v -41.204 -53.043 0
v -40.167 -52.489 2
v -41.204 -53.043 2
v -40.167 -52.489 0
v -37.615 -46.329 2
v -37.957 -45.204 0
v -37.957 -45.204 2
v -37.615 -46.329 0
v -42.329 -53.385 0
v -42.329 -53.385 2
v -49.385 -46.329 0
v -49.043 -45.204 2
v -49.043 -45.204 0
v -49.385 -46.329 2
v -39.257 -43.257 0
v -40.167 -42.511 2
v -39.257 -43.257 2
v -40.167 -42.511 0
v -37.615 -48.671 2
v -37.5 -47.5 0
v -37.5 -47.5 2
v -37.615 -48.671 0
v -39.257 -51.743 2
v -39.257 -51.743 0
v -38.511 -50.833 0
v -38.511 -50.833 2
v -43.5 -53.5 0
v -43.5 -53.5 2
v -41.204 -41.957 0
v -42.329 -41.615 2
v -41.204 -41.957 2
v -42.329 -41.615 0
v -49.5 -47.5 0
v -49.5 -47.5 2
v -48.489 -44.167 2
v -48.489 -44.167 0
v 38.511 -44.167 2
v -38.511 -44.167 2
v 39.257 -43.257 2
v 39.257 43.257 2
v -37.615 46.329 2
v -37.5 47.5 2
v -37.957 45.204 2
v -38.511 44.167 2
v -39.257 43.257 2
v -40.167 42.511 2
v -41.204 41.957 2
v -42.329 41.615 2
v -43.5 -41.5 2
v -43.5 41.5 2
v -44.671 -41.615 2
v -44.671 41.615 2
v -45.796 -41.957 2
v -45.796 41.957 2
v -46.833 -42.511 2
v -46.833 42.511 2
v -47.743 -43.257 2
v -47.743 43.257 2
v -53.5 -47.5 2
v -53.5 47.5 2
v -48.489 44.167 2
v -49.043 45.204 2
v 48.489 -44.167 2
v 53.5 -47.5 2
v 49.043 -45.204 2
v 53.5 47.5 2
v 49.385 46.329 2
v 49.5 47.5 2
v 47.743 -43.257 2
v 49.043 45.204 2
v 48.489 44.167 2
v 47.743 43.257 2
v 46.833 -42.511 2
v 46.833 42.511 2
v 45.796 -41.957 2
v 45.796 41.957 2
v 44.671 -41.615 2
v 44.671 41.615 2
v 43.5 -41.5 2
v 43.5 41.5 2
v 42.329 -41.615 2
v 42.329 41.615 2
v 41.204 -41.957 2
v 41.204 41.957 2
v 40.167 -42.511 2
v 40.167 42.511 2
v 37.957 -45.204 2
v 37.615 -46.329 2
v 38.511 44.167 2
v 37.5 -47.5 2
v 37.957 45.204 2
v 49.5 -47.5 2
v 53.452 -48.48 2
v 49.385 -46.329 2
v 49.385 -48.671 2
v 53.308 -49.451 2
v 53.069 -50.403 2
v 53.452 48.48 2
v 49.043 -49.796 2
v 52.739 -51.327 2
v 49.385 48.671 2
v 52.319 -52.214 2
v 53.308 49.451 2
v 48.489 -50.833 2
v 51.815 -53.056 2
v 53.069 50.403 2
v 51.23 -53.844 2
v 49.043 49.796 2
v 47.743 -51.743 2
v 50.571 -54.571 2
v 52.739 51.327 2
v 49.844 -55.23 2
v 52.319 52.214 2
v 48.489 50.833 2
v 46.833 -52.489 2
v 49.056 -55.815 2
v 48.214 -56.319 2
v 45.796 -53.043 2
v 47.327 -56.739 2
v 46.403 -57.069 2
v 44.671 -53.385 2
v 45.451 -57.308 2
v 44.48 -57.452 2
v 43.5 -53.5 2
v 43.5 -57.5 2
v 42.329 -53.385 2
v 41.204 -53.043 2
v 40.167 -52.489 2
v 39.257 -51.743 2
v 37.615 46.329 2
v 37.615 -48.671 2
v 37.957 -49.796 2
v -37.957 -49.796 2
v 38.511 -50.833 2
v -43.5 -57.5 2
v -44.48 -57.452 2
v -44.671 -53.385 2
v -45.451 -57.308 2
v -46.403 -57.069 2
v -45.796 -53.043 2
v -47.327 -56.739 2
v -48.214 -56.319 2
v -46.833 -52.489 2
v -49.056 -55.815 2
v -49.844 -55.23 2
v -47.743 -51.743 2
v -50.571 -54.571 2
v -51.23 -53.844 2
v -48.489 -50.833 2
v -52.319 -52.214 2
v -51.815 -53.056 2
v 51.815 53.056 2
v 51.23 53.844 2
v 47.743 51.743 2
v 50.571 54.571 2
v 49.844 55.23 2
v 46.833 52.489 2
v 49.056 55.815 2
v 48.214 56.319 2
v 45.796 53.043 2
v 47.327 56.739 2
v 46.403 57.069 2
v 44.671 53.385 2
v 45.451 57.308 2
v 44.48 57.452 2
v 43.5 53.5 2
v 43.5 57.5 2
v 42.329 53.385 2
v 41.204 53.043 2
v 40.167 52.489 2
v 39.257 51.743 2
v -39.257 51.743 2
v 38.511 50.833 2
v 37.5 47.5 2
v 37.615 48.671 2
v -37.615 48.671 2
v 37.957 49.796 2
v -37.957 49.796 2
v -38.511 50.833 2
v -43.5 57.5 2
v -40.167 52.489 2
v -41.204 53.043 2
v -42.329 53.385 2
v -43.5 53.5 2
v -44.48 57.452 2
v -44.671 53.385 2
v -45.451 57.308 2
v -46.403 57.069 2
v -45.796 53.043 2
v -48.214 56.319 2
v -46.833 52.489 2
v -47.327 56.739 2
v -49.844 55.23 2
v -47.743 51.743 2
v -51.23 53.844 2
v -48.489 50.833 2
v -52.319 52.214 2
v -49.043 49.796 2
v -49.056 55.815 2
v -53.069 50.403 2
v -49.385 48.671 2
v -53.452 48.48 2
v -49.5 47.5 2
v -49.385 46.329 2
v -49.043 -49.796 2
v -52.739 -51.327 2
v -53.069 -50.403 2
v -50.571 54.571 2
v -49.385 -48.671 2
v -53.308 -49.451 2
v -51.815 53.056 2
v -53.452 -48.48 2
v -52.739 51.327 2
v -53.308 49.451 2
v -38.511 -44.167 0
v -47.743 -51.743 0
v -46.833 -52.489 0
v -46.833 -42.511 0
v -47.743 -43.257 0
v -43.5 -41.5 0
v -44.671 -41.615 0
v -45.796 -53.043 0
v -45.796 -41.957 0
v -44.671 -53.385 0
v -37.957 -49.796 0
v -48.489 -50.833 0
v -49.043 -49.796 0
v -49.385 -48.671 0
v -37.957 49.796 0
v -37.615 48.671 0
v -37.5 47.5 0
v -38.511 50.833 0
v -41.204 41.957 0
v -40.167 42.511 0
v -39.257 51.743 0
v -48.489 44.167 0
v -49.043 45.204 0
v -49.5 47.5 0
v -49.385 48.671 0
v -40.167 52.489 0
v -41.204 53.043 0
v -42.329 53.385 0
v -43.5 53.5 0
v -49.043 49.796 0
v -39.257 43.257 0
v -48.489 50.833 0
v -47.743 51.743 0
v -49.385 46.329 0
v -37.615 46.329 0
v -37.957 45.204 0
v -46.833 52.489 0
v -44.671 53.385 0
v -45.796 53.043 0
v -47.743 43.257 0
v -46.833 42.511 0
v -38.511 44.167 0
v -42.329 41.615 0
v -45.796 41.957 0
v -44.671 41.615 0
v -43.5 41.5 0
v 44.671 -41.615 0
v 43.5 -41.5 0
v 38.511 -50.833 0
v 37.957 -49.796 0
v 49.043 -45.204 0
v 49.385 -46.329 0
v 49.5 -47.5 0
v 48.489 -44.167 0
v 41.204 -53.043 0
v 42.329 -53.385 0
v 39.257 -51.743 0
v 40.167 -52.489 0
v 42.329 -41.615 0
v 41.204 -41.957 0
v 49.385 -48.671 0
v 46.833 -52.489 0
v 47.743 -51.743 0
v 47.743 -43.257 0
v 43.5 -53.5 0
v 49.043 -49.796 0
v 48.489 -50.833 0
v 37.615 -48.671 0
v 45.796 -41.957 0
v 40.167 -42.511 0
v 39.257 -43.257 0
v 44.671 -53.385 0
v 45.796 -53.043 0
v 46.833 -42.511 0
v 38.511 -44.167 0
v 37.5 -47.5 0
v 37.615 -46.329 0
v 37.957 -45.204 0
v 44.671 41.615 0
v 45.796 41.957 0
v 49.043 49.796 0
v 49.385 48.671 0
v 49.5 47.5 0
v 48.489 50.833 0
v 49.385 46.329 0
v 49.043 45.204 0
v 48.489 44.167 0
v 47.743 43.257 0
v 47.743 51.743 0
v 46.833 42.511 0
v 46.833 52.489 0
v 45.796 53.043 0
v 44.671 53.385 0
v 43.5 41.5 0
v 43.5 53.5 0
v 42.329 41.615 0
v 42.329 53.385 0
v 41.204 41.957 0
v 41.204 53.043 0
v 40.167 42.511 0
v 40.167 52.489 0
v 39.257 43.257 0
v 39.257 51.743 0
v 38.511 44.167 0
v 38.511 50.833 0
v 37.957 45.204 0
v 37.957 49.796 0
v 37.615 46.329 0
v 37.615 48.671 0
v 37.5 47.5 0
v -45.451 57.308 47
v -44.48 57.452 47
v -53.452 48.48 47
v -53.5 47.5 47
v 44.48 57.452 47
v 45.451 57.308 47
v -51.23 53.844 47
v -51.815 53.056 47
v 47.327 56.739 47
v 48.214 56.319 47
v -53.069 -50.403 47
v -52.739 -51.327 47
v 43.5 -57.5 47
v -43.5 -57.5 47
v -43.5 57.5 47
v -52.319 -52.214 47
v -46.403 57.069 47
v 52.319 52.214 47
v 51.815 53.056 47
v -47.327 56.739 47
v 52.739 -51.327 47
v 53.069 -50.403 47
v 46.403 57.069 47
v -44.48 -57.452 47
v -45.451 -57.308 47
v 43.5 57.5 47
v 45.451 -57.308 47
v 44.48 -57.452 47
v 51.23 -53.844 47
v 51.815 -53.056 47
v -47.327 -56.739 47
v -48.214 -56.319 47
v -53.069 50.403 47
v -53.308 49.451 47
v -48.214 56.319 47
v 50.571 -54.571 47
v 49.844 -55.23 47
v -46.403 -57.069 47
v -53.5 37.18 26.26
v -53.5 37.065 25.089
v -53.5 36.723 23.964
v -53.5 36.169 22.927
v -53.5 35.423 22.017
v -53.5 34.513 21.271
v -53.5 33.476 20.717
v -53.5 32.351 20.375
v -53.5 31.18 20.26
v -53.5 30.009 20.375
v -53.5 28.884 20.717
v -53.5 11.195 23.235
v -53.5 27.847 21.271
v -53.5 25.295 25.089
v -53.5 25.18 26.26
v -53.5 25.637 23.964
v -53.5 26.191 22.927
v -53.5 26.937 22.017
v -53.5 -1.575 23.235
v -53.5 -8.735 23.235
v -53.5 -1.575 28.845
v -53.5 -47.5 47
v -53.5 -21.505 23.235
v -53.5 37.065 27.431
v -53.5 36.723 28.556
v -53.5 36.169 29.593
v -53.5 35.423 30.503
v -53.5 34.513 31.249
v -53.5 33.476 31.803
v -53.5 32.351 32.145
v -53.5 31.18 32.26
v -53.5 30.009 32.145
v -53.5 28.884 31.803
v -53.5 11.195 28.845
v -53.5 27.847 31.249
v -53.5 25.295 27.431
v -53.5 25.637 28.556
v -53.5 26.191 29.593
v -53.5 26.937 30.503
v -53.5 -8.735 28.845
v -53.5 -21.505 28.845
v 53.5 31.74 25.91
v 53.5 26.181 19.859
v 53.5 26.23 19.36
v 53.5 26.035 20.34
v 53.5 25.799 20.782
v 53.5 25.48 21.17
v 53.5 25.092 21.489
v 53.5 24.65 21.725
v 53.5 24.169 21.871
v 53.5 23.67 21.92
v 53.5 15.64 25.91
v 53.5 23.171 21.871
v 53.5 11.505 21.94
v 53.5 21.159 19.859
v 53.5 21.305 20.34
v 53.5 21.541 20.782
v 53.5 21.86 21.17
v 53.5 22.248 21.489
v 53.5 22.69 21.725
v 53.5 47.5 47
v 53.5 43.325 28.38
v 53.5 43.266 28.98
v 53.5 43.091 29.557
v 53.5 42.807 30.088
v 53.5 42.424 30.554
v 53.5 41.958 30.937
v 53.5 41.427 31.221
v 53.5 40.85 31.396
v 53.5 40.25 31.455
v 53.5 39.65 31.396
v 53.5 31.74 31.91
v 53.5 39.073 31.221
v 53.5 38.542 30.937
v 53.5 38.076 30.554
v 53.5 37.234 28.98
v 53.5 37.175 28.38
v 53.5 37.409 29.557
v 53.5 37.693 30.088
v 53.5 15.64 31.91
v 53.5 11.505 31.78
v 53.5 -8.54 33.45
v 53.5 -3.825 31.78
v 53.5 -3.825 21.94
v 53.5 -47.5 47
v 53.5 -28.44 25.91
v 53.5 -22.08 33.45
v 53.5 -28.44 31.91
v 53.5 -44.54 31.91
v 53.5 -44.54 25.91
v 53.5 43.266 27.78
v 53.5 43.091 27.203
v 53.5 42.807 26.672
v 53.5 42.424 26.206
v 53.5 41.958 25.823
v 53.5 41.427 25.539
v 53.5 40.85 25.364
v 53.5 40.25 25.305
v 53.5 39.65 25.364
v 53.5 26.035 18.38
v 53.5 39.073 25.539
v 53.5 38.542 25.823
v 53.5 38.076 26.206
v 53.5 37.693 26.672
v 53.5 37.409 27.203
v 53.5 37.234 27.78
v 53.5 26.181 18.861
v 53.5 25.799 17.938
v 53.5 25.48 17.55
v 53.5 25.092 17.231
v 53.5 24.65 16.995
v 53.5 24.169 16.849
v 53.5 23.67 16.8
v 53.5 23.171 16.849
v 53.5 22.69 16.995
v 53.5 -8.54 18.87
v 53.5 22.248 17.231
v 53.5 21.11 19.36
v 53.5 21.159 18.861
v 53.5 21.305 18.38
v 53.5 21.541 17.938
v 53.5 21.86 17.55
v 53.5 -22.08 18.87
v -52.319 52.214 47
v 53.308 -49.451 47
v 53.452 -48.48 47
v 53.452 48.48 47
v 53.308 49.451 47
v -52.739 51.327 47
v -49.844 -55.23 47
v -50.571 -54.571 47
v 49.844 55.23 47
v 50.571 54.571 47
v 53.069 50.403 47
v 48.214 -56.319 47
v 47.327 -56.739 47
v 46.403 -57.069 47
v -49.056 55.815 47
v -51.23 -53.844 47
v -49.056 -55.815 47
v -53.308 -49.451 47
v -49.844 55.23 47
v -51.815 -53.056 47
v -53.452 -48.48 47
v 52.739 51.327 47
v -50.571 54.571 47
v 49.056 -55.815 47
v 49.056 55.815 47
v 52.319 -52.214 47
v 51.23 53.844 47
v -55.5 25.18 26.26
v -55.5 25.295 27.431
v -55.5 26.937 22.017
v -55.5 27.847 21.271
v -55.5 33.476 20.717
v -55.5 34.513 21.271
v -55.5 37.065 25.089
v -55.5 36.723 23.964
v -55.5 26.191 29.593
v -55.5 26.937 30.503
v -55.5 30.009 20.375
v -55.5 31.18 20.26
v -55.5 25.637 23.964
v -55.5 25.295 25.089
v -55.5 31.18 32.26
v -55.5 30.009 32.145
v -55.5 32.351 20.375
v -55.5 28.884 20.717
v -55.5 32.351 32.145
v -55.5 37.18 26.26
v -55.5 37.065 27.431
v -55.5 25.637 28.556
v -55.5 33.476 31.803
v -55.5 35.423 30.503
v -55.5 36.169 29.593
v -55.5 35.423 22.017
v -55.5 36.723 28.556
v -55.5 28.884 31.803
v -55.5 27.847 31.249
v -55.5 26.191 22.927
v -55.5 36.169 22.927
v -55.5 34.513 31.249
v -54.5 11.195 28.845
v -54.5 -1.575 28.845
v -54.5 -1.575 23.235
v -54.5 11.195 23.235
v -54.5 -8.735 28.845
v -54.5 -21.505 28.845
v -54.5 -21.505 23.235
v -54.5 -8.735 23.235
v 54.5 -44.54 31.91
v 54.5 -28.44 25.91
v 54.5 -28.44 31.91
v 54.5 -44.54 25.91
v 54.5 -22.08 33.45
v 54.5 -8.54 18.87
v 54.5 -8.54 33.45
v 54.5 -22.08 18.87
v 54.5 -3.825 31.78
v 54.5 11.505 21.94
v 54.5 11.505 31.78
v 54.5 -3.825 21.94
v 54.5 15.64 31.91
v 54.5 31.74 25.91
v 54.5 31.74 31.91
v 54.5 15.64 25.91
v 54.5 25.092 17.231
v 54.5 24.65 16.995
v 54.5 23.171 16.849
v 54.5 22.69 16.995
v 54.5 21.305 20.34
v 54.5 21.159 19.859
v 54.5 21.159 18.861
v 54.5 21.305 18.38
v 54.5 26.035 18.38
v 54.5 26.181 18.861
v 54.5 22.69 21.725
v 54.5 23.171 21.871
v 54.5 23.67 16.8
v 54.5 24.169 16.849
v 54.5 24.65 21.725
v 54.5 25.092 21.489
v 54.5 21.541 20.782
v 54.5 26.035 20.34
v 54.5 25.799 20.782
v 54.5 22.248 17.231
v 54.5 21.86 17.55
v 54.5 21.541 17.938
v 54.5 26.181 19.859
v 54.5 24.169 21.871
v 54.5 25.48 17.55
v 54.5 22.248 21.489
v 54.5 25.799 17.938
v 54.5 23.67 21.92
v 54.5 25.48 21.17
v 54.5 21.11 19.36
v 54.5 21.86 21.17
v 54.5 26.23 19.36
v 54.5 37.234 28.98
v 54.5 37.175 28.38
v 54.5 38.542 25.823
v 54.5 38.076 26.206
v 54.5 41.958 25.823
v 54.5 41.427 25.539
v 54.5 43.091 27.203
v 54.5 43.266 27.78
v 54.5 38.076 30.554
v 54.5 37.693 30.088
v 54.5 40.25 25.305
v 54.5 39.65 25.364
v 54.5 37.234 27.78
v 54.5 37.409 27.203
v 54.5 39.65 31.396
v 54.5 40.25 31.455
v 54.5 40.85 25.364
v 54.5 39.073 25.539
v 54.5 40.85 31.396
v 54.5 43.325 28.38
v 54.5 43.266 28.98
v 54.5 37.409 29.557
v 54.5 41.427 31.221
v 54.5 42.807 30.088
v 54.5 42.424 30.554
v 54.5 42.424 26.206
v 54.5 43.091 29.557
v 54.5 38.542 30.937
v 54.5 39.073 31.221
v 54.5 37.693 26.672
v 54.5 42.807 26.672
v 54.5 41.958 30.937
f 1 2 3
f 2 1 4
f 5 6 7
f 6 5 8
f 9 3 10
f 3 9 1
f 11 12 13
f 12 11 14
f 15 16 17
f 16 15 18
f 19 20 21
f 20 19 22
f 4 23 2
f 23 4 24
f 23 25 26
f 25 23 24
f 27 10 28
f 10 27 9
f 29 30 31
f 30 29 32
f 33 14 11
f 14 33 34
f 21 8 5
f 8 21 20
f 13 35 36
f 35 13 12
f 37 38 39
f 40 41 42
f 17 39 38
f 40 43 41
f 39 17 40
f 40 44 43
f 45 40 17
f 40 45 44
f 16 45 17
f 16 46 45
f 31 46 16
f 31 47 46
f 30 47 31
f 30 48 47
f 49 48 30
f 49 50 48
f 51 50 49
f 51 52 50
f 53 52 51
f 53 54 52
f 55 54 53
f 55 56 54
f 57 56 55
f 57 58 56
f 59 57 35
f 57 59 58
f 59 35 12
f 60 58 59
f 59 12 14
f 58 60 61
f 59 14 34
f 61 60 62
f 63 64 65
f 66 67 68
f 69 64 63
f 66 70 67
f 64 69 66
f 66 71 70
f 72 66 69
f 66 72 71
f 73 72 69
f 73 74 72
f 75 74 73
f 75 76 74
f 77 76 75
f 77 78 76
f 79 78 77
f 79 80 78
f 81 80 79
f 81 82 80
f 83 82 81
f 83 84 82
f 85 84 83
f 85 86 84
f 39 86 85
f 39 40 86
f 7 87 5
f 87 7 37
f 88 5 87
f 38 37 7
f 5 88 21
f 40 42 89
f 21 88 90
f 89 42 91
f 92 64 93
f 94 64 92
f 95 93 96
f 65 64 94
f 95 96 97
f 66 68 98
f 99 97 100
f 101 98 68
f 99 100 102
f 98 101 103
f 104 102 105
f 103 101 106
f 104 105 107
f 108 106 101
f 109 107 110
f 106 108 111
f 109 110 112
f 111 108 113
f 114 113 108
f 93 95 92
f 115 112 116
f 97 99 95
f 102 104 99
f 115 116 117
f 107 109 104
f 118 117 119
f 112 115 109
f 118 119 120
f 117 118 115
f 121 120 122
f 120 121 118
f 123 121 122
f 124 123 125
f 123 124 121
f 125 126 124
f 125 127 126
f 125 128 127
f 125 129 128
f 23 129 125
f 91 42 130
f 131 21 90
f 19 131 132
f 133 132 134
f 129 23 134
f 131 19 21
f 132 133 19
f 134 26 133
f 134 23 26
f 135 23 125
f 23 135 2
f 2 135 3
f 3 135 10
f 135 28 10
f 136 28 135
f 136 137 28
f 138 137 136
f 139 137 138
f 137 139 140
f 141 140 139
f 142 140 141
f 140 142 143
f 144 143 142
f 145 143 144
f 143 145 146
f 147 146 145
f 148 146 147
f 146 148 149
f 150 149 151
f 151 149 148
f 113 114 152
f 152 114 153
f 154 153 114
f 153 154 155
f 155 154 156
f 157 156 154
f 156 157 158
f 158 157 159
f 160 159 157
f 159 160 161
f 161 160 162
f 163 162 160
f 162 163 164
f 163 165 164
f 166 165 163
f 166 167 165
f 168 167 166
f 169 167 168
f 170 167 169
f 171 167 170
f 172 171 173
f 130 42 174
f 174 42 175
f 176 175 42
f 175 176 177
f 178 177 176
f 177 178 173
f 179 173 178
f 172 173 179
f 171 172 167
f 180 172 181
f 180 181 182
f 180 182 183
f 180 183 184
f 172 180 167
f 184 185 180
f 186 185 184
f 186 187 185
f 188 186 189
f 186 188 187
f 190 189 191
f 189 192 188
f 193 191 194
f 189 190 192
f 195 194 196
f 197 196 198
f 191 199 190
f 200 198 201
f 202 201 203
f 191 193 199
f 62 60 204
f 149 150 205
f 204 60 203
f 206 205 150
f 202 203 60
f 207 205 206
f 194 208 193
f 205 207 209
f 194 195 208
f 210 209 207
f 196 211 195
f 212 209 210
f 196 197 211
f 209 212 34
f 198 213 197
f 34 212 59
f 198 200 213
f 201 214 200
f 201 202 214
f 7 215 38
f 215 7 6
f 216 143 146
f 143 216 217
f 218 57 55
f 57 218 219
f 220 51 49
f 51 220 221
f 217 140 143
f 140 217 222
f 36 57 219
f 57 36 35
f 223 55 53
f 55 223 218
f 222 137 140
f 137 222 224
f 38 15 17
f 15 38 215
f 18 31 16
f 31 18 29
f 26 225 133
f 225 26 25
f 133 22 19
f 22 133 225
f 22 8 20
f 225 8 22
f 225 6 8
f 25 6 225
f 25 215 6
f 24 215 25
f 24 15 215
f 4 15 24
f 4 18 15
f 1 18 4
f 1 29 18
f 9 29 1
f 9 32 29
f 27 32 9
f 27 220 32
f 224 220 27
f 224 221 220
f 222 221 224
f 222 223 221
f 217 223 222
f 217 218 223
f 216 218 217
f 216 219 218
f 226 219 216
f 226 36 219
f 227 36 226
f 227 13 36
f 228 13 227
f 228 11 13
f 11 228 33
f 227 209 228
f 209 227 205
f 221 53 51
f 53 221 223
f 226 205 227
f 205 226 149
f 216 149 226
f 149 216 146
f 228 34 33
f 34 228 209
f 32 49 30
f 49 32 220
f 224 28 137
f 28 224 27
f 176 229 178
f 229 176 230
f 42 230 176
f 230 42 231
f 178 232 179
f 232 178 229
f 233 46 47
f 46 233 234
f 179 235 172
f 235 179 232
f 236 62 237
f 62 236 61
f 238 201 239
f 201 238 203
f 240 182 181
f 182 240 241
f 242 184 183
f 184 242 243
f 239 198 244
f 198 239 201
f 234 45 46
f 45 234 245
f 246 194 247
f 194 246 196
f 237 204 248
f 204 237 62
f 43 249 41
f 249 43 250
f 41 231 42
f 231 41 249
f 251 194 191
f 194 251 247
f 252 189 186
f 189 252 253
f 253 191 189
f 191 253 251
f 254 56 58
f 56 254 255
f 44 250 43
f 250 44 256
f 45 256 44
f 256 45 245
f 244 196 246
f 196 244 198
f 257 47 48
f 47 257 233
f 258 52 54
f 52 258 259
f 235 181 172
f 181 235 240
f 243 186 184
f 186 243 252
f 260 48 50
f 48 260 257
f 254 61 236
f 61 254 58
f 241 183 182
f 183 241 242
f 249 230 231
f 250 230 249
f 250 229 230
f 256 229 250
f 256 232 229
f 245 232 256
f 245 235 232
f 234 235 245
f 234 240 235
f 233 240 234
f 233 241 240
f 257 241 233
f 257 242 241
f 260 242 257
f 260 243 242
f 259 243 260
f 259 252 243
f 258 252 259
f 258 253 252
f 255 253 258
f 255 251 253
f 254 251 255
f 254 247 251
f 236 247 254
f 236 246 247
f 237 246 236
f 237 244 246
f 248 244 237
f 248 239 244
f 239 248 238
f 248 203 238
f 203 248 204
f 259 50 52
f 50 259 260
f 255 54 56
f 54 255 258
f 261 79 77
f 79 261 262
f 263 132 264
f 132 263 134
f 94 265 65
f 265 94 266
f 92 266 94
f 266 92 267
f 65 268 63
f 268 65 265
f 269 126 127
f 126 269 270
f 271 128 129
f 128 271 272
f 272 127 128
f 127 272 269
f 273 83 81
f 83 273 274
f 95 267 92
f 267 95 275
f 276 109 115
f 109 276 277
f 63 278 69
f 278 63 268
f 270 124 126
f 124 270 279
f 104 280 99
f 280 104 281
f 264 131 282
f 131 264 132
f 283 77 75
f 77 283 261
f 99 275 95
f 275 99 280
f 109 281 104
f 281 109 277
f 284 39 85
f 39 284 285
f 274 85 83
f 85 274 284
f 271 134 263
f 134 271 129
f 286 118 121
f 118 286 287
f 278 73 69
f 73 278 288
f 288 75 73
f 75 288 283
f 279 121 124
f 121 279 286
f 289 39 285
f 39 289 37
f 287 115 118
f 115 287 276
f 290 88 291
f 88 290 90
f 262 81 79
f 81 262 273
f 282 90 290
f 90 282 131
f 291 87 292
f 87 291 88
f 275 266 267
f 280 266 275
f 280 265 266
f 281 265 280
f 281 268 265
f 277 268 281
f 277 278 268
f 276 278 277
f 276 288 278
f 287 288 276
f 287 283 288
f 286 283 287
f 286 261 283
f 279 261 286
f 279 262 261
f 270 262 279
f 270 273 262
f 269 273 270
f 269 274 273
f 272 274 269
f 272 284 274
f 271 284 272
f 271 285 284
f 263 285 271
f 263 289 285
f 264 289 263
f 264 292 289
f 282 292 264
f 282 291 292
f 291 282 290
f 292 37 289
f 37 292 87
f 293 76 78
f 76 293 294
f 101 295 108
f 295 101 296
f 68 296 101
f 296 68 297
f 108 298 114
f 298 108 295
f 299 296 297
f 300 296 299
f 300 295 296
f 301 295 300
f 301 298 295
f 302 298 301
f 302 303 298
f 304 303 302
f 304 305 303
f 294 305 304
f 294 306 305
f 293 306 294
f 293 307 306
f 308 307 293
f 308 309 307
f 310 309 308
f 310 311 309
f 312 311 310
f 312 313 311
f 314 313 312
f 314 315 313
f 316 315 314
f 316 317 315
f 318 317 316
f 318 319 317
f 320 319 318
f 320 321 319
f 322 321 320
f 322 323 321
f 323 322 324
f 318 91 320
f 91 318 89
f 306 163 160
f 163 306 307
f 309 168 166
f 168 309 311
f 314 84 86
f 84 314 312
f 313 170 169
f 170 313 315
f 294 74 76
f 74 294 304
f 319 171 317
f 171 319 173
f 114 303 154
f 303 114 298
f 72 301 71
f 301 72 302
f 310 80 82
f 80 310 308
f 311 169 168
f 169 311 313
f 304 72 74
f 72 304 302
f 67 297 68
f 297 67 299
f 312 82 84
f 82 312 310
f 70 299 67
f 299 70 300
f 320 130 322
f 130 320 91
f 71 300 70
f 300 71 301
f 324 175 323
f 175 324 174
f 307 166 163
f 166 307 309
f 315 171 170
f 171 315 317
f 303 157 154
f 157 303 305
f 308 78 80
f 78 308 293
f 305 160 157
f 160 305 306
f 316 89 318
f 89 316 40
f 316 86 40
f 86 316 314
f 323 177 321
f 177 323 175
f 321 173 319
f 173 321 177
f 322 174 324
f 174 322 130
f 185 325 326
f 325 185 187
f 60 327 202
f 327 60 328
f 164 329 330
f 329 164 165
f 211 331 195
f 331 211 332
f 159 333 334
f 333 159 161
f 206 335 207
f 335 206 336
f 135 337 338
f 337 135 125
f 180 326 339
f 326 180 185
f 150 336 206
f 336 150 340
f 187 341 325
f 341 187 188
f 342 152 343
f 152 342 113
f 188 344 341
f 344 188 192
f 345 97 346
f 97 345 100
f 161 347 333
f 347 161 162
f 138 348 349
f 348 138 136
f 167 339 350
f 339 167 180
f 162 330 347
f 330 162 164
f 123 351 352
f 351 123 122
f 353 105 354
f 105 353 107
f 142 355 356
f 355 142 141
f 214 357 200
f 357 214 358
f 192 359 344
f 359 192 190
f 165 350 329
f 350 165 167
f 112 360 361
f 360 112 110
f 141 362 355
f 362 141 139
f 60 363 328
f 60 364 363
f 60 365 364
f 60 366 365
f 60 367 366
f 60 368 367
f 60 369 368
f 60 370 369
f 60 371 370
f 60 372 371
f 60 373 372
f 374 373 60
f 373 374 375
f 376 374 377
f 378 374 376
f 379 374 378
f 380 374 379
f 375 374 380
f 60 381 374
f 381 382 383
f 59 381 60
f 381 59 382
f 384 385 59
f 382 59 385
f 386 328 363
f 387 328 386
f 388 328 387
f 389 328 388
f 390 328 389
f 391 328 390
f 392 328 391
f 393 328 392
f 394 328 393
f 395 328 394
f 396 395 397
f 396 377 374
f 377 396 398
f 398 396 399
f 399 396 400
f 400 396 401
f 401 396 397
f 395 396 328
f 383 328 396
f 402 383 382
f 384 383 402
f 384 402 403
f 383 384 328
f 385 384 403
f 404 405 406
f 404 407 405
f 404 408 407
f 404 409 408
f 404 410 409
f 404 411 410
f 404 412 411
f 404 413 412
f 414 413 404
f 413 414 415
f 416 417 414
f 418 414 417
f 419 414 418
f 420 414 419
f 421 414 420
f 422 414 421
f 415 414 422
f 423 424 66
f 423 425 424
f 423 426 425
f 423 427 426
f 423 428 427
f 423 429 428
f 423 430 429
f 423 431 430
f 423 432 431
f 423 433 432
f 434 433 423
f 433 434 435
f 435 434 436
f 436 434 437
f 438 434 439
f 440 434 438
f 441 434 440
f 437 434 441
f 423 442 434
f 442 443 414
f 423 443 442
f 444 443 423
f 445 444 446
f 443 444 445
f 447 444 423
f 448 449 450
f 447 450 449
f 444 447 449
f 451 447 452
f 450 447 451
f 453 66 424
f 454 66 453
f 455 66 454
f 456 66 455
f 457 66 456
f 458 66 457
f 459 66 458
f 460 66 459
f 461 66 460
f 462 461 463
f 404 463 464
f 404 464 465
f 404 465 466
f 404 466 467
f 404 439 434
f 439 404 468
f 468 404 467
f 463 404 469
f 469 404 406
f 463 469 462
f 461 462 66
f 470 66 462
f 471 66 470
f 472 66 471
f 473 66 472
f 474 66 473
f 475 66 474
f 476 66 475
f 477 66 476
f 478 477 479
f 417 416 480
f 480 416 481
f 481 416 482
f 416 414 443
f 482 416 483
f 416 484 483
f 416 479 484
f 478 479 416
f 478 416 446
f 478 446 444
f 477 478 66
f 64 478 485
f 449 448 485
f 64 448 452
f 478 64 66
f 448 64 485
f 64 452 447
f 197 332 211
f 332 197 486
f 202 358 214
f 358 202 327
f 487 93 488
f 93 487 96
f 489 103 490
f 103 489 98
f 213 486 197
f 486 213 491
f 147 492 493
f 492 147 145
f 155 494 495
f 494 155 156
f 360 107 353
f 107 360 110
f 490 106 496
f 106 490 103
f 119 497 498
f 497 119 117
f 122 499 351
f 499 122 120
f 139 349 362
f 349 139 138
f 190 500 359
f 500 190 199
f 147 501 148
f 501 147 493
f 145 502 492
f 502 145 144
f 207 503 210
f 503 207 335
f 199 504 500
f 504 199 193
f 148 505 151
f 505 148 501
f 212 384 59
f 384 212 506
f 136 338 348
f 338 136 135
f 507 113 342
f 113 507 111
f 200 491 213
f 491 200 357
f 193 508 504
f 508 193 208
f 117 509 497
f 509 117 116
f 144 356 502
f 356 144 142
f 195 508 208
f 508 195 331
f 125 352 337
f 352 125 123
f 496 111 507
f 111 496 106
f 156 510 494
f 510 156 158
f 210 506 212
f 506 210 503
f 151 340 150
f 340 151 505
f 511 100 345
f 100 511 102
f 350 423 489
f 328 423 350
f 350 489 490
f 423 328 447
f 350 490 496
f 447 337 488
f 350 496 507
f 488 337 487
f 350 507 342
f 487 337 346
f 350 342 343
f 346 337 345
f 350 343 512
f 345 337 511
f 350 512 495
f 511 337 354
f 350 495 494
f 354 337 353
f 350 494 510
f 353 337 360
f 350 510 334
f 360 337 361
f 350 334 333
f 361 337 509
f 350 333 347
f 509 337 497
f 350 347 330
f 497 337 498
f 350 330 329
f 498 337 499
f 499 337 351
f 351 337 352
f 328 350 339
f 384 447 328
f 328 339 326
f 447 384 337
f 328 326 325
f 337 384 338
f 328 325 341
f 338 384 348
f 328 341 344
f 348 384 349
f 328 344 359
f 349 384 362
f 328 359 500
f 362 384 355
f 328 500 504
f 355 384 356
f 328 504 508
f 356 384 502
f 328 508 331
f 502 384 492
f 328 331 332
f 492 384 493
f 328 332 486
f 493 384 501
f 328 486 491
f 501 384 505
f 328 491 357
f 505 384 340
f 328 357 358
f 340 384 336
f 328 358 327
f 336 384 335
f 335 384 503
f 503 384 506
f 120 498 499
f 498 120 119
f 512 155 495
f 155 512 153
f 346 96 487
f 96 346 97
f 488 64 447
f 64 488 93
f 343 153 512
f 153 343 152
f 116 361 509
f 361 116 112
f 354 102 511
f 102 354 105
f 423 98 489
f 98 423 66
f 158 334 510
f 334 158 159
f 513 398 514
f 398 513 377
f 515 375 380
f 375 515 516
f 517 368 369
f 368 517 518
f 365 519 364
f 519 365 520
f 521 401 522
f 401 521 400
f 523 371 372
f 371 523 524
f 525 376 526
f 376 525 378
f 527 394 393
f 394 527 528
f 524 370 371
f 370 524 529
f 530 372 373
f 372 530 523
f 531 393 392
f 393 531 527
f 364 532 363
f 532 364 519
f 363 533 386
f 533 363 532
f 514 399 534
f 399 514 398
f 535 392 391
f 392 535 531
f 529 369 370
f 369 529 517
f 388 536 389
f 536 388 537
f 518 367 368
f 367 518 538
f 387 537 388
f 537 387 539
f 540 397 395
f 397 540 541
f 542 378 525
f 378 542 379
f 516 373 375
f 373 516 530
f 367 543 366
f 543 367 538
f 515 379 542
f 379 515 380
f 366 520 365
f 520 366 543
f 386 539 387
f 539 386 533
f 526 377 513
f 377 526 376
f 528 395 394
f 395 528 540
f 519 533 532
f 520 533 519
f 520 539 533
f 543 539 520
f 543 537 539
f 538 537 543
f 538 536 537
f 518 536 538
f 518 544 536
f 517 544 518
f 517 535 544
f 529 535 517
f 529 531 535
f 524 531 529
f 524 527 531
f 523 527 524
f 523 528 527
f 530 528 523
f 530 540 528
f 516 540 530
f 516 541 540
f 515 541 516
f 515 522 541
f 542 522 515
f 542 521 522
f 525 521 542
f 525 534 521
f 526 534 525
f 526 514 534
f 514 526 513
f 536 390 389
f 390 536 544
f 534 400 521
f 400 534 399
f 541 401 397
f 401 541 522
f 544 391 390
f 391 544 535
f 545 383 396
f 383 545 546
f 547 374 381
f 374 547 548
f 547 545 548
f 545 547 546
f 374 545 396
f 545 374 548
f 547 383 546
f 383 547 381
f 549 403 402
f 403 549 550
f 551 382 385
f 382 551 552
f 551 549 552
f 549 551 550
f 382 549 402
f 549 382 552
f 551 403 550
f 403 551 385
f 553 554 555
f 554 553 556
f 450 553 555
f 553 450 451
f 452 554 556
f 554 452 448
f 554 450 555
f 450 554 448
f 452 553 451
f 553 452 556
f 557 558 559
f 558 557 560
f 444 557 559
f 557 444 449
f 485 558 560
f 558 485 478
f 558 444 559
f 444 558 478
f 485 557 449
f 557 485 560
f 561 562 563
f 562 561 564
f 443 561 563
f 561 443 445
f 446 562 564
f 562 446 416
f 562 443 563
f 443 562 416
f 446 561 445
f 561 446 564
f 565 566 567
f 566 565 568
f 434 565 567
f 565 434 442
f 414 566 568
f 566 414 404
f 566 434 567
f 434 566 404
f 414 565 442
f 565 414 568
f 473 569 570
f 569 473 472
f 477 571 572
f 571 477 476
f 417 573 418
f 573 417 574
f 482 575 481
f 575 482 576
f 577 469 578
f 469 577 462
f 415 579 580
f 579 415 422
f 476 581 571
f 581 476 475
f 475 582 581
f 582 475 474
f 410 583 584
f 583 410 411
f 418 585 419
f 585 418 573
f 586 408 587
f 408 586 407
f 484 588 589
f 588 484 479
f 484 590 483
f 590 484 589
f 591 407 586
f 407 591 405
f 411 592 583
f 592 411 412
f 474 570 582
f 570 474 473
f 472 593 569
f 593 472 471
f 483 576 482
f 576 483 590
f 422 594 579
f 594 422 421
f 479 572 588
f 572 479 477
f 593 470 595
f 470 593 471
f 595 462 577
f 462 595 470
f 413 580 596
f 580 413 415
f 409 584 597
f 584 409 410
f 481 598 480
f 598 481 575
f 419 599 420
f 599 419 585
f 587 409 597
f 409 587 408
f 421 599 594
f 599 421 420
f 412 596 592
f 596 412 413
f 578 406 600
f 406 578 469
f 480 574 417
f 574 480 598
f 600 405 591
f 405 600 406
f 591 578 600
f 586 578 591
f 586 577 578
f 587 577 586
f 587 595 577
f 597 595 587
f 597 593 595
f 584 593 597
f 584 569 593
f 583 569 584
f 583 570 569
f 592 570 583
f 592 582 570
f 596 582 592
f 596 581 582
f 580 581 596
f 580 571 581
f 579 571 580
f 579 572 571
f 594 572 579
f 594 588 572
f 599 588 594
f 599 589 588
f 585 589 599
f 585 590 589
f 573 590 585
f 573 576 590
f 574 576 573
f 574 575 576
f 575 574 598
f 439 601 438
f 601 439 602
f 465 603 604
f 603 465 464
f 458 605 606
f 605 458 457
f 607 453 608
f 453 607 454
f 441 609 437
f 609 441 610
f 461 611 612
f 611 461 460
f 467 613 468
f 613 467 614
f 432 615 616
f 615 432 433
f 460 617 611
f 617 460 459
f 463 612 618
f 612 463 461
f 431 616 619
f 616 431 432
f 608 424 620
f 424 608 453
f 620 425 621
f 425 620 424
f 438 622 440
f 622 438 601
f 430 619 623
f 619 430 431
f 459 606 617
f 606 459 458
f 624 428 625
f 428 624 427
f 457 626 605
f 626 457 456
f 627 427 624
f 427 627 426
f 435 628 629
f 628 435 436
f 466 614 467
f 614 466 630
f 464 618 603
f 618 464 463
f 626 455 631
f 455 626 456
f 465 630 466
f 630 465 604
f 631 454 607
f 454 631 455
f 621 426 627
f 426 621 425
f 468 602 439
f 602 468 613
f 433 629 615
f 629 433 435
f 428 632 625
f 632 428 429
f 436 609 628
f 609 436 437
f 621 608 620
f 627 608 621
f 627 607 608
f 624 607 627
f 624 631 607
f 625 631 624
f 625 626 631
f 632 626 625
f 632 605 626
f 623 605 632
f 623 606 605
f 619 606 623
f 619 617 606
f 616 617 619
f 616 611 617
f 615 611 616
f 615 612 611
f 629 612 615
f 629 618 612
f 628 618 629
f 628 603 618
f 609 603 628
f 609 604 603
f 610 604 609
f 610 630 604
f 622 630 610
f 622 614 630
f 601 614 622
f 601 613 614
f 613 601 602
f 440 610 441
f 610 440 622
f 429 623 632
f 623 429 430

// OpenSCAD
module gmktec_nuc_g3() {
    translate([0,0,24.5]) {
        // Base volume (rounded corners, r=10)
        color("darkgray")
        hull() {
            translate([107/2 - 10, 115/2 - 10, 0]) cylinder(h=45, r=10, center=true, $fn=64);
            translate([-107/2 + 10, 115/2 - 10, 0]) cylinder(h=45, r=10, center=true, $fn=64);
            translate([107/2 - 10, -115/2 + 10, 0]) cylinder(h=45, r=10, center=true, $fn=64);
            translate([-107/2 + 10, -115/2 + 10, 0]) cylinder(h=45, r=10, center=true, $fn=64);
        }

        // Power button (Front panel, derived from SVG)
        color("green")
        translate([-107/2 - 1, 31.18, 1.76])
            rotate([0, 90, 0])
            cylinder(h=2, d=12, center=true, $fn=32);

        // Front USB Port 1 (derived from SVG)
        color("blue")
        translate([-107/2 - 0.5, 4.81, 1.54])
            cube([1, 12.77, 5.61], center=true);

        // Front USB Port 2 (derived from SVG)
        color("blue")
        translate([-107/2 - 0.5, -15.12, 1.54])
            cube([1, 12.77, 5.61], center=true);

        // Back Panel I/O (derived from SVG)
        
        // HDMI 1 (Left)
        color("black")
        translate([107/2 + 0.5, -36.49, 4.41])
            cube([1, 16.10, 6.00], center=true);

        // 2x USB
        color("blue")
        translate([107/2 + 0.5, -15.31, 1.66])
            cube([1, 13.54, 14.58], center=true);

        // Ethernet
        color("gray")
        translate([107/2 + 0.5, 3.84, 2.36])
            cube([1, 15.33, 9.84], center=true);

        // HDMI 2 (Right)
        color("black")
        translate([107/2 + 0.5, 23.69, 4.41])
            cube([1, 16.10, 6.00], center=true);

        // Audio Jack
        color("black")
        translate([107/2 + 0.5, 23.67, -5.14])
            rotate([0, 90, 0])
            cylinder(h=1, d=5.12, center=true, $fn=32);

        // DC Power
        color("black")
        translate([107/2 + 0.5, 40.25, 3.88])
            rotate([0, 90, 0])
            cylinder(h=1, d=6.15, center=true, $fn=32);

        // 4x Bottom Foam Pads
        // d=12mm, 4mm from edge to edge of pad (10mm from edge to center)
        color("darkgray")
        for (dx = [-1, 1], dy = [-1, 1]) {
            translate([dx * (107/2 - 10), dy * (115/2 - 10), -45/2 - 1])
                cylinder(h=2, d=12, center=true, $fn=32);
        }
    }
}


gmktec_nuc_g3();
